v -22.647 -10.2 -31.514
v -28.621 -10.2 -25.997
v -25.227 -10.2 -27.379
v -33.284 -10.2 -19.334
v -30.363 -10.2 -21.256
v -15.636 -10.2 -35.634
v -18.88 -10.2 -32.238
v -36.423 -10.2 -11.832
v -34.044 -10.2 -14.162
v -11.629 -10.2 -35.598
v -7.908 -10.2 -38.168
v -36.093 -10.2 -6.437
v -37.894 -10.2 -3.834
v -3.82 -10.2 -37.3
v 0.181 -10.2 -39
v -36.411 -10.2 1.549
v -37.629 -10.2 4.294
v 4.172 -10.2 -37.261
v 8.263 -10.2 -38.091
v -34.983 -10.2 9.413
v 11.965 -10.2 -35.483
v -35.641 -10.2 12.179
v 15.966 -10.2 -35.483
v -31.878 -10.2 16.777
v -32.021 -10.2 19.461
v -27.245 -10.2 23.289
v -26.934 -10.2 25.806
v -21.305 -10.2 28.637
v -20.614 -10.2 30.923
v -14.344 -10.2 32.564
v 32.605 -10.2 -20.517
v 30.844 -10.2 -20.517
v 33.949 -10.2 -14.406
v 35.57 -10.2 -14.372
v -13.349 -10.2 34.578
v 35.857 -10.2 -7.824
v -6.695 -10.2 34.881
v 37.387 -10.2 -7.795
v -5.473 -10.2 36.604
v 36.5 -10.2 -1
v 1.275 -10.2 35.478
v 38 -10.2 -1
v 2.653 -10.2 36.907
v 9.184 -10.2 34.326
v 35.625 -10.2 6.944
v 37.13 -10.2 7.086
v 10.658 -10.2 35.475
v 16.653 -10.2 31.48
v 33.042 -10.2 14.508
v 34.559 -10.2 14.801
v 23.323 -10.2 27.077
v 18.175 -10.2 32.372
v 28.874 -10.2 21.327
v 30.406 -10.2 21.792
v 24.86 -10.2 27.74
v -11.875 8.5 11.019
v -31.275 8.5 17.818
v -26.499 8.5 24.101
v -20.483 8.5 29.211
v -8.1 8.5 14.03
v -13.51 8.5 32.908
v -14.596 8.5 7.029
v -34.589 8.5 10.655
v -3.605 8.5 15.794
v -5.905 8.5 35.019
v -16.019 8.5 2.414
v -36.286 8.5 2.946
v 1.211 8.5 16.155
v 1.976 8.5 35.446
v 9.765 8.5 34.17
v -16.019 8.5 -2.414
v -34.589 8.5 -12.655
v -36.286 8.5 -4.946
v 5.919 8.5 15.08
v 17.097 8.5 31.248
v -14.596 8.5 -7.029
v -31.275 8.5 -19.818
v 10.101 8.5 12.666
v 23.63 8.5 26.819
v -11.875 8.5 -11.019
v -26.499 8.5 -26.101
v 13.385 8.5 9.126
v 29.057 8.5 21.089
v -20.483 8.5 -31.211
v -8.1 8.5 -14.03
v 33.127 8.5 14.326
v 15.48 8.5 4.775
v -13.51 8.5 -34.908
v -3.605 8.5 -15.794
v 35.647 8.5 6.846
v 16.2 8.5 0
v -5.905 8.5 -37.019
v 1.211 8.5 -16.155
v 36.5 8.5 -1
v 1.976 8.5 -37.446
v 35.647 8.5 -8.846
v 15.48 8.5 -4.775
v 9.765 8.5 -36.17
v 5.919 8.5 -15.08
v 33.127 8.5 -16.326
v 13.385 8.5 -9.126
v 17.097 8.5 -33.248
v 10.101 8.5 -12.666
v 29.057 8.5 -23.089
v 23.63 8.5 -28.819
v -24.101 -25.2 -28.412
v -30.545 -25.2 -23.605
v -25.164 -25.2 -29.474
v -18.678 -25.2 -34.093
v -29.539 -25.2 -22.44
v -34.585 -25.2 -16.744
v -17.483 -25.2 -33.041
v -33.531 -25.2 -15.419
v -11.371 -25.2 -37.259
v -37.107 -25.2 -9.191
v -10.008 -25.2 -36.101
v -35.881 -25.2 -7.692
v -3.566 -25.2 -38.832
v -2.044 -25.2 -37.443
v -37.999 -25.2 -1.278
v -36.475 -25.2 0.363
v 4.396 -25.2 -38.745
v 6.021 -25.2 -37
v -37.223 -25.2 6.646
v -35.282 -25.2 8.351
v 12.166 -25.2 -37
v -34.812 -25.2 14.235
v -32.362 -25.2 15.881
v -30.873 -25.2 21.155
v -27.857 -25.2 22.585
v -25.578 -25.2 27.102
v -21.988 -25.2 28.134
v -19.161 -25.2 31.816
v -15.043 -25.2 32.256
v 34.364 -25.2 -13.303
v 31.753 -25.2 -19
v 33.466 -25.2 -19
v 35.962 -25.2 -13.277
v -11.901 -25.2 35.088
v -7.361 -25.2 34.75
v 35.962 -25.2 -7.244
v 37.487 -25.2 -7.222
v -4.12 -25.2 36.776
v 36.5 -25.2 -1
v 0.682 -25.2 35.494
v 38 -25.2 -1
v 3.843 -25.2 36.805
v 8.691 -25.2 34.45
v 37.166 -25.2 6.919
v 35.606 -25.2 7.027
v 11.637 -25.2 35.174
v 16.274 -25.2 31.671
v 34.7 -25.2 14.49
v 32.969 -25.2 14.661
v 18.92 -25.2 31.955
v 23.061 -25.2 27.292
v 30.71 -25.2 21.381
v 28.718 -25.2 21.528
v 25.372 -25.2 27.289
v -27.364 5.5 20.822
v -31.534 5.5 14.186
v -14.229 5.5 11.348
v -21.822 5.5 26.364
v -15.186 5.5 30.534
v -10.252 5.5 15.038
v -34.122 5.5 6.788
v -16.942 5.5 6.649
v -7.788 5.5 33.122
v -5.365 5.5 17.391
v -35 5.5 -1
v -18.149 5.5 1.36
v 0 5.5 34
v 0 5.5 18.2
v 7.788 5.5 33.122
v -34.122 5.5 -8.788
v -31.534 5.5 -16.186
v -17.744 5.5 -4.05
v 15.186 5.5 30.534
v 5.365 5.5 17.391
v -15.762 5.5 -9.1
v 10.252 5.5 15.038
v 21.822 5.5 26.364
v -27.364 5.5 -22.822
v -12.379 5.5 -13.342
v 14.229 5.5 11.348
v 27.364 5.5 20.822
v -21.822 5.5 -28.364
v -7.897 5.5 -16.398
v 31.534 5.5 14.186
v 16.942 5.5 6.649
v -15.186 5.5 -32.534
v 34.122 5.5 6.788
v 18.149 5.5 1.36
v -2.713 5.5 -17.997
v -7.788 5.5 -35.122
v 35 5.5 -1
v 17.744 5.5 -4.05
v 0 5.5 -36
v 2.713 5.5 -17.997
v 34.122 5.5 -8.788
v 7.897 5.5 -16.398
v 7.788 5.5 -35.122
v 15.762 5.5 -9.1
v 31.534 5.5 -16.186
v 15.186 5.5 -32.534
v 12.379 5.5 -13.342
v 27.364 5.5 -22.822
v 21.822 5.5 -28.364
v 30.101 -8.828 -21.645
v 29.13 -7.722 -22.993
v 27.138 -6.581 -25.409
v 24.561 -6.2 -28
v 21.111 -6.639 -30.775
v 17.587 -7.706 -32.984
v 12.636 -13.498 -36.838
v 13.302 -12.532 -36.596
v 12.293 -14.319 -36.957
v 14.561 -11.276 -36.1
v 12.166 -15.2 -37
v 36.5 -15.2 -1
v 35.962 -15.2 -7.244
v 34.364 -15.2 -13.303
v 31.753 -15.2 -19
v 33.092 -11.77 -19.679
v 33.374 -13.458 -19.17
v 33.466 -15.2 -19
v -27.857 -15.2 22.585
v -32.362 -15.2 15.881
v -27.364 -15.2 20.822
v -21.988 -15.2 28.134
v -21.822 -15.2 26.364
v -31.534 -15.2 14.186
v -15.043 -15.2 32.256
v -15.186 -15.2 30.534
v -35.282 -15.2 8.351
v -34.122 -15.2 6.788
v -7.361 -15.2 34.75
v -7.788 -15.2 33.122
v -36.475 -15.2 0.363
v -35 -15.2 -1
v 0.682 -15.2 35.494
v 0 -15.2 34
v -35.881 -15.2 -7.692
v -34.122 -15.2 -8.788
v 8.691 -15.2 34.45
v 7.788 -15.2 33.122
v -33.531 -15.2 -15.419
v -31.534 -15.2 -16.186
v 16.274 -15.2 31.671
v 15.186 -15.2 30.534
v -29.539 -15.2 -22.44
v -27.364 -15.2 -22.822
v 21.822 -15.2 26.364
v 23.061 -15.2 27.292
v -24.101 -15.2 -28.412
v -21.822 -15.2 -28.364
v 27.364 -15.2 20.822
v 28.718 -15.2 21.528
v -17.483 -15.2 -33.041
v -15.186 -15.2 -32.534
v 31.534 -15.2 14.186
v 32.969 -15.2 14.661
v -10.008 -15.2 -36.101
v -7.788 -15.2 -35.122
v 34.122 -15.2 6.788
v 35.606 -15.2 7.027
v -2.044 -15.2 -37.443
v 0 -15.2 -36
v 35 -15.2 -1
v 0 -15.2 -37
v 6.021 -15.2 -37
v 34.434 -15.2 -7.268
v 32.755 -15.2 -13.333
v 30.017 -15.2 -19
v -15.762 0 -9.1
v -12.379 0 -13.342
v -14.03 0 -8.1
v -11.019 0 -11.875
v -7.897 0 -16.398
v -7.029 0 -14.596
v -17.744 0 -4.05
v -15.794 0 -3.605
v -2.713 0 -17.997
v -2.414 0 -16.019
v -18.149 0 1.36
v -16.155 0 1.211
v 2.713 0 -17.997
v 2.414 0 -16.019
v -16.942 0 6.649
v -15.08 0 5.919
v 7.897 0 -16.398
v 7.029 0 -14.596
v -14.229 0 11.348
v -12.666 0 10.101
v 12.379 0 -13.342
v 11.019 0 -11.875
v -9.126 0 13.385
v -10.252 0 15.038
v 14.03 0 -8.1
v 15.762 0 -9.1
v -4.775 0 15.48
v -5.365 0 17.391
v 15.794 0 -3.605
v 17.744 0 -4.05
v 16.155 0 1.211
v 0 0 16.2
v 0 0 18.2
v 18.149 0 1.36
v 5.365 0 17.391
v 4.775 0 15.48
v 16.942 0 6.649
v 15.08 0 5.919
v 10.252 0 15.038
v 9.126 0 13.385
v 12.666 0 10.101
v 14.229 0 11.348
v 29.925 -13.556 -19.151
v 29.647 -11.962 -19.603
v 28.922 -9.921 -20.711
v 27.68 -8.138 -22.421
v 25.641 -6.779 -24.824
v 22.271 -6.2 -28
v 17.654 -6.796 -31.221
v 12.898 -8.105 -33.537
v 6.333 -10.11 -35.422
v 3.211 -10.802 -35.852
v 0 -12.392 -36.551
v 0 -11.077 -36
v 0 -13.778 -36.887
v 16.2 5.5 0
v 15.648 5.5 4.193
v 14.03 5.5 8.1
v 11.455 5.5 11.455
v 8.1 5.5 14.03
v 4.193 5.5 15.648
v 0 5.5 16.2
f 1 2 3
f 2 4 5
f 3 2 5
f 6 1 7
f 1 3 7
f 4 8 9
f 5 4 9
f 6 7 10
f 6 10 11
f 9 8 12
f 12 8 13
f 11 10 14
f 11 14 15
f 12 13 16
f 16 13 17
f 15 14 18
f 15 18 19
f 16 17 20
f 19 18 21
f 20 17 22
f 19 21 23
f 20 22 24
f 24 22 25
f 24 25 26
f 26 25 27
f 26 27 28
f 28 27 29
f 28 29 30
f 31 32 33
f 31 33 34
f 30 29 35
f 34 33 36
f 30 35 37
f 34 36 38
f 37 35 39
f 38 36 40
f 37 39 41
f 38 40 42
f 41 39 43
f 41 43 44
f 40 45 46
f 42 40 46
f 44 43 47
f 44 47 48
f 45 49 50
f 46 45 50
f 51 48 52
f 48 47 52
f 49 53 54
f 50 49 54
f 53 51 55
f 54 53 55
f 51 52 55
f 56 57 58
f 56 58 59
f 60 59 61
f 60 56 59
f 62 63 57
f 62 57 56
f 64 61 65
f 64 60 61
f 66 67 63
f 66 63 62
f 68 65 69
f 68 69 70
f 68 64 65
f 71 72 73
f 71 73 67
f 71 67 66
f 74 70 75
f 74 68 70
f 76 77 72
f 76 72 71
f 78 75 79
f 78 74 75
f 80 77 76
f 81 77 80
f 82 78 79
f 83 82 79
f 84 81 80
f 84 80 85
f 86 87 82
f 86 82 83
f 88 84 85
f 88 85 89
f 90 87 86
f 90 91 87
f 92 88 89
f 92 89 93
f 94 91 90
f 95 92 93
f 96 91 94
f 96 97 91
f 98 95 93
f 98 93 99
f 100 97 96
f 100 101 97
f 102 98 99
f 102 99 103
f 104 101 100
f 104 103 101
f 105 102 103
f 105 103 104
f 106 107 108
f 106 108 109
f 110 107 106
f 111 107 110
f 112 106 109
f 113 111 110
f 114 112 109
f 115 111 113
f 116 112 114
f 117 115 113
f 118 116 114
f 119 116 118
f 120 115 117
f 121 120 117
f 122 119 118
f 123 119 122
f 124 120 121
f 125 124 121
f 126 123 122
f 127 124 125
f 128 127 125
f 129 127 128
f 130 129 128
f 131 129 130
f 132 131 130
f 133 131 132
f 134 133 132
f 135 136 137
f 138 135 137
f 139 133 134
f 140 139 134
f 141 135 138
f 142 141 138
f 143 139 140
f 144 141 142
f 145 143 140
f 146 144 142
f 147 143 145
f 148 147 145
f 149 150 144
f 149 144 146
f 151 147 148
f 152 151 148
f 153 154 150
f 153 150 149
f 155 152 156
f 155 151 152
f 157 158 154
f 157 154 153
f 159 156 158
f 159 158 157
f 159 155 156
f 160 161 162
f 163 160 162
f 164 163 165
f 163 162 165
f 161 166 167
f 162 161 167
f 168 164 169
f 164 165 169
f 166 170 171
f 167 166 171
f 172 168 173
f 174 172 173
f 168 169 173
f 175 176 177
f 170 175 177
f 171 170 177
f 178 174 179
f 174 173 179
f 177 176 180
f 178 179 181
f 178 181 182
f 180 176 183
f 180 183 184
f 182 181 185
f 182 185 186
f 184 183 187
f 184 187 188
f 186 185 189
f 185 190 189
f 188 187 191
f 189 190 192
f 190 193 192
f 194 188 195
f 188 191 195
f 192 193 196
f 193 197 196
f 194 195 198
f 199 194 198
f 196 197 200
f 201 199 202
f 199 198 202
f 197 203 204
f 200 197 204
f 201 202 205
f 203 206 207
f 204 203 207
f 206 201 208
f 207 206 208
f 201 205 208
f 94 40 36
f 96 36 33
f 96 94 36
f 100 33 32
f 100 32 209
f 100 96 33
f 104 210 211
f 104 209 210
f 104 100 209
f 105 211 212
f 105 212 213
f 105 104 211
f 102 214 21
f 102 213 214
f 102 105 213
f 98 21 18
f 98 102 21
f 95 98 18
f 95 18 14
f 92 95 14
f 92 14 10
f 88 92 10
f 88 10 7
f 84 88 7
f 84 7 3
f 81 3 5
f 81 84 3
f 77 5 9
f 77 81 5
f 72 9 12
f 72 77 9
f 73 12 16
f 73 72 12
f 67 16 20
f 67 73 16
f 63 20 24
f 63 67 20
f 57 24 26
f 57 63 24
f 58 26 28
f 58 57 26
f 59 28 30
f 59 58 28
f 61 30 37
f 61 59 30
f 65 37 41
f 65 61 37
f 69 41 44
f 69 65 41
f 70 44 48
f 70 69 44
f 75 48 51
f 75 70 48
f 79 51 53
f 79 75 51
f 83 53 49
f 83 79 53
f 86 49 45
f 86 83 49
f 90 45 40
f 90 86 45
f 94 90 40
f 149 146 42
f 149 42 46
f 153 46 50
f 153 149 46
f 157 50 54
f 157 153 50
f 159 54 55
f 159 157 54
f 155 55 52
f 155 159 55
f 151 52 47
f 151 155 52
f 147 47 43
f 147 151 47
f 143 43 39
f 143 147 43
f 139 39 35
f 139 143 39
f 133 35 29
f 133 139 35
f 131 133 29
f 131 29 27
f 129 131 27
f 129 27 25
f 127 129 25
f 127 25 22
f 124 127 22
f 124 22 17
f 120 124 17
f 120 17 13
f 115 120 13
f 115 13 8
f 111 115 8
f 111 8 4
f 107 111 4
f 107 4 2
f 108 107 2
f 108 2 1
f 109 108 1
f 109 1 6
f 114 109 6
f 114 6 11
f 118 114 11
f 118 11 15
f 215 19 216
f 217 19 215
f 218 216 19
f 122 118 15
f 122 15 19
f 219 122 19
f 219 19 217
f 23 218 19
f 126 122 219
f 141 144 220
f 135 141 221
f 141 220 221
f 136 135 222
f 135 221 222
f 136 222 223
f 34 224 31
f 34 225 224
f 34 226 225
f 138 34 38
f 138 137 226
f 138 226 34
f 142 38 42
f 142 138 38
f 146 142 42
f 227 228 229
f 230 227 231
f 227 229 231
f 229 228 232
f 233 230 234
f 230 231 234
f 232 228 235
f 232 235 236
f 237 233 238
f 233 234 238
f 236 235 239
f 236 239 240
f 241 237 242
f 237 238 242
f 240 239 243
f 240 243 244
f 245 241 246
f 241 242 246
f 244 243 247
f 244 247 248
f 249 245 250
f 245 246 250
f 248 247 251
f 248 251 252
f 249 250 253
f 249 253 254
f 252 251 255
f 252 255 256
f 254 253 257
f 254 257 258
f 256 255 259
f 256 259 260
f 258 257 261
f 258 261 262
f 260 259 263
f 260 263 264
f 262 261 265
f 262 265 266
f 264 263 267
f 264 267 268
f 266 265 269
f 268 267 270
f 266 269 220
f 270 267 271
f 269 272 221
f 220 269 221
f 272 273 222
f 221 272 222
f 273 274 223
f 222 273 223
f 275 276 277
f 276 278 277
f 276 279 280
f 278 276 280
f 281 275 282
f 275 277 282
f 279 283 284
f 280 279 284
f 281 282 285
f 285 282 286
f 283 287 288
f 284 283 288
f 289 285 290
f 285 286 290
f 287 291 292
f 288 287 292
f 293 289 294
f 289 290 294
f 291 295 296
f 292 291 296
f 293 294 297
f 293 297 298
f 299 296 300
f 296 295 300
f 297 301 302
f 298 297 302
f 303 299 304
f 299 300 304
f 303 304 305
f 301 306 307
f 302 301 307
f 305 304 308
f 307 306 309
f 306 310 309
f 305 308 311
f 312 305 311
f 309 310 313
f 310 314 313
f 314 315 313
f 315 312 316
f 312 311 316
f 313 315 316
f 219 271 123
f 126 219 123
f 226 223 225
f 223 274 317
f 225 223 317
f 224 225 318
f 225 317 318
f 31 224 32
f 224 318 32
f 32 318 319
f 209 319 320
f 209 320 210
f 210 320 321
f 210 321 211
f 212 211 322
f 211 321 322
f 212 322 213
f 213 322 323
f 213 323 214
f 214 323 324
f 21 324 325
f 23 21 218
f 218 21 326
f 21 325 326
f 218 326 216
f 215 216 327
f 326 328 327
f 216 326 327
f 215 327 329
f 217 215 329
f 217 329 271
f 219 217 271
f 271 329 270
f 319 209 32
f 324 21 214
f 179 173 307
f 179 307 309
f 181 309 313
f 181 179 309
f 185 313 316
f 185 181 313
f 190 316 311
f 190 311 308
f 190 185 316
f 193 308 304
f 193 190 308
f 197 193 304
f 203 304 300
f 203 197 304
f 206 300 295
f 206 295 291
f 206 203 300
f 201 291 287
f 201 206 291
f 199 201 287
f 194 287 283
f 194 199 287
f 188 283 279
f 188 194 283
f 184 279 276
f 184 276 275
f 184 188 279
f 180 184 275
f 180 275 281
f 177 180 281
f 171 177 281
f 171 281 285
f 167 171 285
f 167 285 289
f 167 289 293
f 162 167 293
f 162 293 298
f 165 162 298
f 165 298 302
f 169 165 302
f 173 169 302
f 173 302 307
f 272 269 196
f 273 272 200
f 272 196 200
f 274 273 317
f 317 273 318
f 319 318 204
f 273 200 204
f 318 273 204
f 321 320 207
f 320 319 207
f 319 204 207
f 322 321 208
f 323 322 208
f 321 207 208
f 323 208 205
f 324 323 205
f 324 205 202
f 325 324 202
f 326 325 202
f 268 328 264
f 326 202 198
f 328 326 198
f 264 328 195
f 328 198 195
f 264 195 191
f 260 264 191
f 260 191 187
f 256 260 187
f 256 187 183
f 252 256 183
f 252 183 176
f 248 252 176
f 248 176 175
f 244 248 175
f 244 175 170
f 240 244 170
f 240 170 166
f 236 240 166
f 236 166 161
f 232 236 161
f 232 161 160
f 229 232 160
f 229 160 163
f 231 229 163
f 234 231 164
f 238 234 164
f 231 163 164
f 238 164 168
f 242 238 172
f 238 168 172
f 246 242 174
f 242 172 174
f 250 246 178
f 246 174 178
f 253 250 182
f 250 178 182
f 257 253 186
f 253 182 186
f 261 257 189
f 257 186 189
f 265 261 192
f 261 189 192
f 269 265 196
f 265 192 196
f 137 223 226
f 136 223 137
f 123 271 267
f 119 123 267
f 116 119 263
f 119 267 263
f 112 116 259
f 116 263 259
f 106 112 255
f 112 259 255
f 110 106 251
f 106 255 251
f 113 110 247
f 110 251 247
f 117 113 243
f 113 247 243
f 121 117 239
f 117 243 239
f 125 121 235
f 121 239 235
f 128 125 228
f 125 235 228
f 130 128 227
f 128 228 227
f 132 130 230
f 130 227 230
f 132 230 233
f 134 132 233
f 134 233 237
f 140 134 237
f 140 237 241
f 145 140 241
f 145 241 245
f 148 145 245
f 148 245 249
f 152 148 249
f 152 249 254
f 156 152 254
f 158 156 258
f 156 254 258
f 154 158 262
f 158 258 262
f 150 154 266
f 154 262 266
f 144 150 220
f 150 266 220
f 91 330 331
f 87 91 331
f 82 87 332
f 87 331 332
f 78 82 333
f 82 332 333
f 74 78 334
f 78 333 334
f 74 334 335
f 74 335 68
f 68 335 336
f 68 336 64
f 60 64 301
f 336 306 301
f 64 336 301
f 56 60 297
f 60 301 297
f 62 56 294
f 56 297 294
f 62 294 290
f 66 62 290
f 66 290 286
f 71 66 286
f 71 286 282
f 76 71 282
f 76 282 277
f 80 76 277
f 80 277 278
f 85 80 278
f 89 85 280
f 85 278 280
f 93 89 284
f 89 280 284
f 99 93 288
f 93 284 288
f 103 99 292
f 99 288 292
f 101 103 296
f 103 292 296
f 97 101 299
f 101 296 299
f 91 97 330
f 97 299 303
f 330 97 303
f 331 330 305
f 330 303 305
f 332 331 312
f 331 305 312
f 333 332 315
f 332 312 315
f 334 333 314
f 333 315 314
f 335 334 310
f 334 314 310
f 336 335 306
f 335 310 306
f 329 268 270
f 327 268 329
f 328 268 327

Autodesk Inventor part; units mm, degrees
ref_plane "YZ Plane" through (0, 0, 0) normal (1, 0, 0) x (0, 1, 0)
ref_plane "XZ Plane" through (0, 0, 0) normal (0, 1, 0) x (-1, 0, 0)
ref_plane "XY Plane" through (0, 0, 0) normal (0, 0, 1) x (1, 0, 0)
sketch "Sketch1" plane through (0, 0, 0) normal (1, 0, 0) x (0, 1, 0)
  line L0 (0, 14.6) -> (6.55, 14.6)
  line L1 (6.55, 14.6) -> (6.55, 16.2)
  line L2 (0, 0) -> (0, 21.161) construction
  line L3 (6.55, 16.2) -> (0, 16.2)
  line L4 (0, 16.2) -> (0, 18.2)
  line L5 (0, 18.2) -> (8.5, 18.2)
  line L6 (8.5, 18.2) -> (8.5, 10.2659) construction
  line L7 (8.5, 13.1) -> (3, 13.1)
  line L8 (8.5, 18.2) -> (8.5, 13.1)
  line L9 (0, 2.5) -> (3, 2.5)
  line L10 (0, 0) -> (11.9587, 0) construction
  line L11 (3, 2.5) -> (3, 13.1)
  line L12 (0, 14.6) -> (0, 2.5)
  line L13 (6.55, 16.2) -> (8.5, 16.2)
  dimension "d0" = 6.55
  dimension "d1" = 14.6
  dimension "d2" = 16.2
  dimension "d3" = 2
  dimension "d4" = 8.5
  dimension "d5" = 1.5
  dimension "d6" = 3
  dimension "d7" = 2.5
revolve "Revolution1" add sketch "Sketch1" angle 360 about axis through (0, 0, 0) along (0, 1, 0) contours L3 L4 L5 L8 L13
sketch "Sketch5" plane through (0, 8.5, 0) normal (0, 1, 0) x (1, 0, 0)
  line L0 (0, 0) -> (0, 1)
  circle A0 centre (0, 1) radius 35
  circle A1 centre (0, 1) radius 36.5
  circle A2 centre (0, 0) radius 16.2
  dimension "d29" = 1
  dimension "d30" = 70
  dimension "d31" = 73
extrude "Extrusion2" add sketch "Sketch5" against normal blind 3 contours A0 | A2
extrude "Extrusion3" add sketch "Sketch5" against normal blind 23.7 contours A1
sketch "Sketch7" plane through (0, 5.5, 0) normal (0, -1, 0) x (1, 0, 0)
  circle A0 centre (0, 0) radius 16.2
extrude "Extrusion5" cut sketch "Sketch7" against normal blind 10
sketch "Sketch8" plane through (0, -15.2, 0) normal (0, -1, 0) x (1, 0, 0)
  circle A0 centre (0, -1) radius 36.5
  circle A1 centre (0, -1) radius 38
  point P0 (0, 0)
  dimension "d43" = 73
  dimension "d44" = 1
  dimension "d45" = 76
extrude "Extrusion6" add sketch "Sketch8" along normal blind 10 and the other way blind 5
sketch "Sketch10" plane through (0, 0, 0) normal (1, 0, 0) x (0, 1, 0)
  line L0 (-15.2, -1) -> (-15.2, -20.5)
  line L1 (-15.2, -36) -> (-15.2, 34) projected
  line L2 (-15.2, -20.5) -> (-15.2, -28)
  circle A0 centre (-15.2, -28) radius 9
  line L3 (-15.2, -19) -> (-25.2, -19)
  line L4 (-15.2, 35.5) -> (-15.2, -37.5) projected
  line L5 (-15.2, -37) -> (-25.2, -37)
  line L6 (-25.2, -37) -> (-25.2, -19)
  point P0 (0, 0)
  point P1 (-15.2, -1)
  point P2 (-25.2, -1)
  dimension "d60" = 19.5
  dimension "d61" = 7.5
  dimension "d62" = 18
extrude "Extrusion8" cut sketch "Sketch10" along normal through all
properties part number "Top of Housing.ipt v2"
